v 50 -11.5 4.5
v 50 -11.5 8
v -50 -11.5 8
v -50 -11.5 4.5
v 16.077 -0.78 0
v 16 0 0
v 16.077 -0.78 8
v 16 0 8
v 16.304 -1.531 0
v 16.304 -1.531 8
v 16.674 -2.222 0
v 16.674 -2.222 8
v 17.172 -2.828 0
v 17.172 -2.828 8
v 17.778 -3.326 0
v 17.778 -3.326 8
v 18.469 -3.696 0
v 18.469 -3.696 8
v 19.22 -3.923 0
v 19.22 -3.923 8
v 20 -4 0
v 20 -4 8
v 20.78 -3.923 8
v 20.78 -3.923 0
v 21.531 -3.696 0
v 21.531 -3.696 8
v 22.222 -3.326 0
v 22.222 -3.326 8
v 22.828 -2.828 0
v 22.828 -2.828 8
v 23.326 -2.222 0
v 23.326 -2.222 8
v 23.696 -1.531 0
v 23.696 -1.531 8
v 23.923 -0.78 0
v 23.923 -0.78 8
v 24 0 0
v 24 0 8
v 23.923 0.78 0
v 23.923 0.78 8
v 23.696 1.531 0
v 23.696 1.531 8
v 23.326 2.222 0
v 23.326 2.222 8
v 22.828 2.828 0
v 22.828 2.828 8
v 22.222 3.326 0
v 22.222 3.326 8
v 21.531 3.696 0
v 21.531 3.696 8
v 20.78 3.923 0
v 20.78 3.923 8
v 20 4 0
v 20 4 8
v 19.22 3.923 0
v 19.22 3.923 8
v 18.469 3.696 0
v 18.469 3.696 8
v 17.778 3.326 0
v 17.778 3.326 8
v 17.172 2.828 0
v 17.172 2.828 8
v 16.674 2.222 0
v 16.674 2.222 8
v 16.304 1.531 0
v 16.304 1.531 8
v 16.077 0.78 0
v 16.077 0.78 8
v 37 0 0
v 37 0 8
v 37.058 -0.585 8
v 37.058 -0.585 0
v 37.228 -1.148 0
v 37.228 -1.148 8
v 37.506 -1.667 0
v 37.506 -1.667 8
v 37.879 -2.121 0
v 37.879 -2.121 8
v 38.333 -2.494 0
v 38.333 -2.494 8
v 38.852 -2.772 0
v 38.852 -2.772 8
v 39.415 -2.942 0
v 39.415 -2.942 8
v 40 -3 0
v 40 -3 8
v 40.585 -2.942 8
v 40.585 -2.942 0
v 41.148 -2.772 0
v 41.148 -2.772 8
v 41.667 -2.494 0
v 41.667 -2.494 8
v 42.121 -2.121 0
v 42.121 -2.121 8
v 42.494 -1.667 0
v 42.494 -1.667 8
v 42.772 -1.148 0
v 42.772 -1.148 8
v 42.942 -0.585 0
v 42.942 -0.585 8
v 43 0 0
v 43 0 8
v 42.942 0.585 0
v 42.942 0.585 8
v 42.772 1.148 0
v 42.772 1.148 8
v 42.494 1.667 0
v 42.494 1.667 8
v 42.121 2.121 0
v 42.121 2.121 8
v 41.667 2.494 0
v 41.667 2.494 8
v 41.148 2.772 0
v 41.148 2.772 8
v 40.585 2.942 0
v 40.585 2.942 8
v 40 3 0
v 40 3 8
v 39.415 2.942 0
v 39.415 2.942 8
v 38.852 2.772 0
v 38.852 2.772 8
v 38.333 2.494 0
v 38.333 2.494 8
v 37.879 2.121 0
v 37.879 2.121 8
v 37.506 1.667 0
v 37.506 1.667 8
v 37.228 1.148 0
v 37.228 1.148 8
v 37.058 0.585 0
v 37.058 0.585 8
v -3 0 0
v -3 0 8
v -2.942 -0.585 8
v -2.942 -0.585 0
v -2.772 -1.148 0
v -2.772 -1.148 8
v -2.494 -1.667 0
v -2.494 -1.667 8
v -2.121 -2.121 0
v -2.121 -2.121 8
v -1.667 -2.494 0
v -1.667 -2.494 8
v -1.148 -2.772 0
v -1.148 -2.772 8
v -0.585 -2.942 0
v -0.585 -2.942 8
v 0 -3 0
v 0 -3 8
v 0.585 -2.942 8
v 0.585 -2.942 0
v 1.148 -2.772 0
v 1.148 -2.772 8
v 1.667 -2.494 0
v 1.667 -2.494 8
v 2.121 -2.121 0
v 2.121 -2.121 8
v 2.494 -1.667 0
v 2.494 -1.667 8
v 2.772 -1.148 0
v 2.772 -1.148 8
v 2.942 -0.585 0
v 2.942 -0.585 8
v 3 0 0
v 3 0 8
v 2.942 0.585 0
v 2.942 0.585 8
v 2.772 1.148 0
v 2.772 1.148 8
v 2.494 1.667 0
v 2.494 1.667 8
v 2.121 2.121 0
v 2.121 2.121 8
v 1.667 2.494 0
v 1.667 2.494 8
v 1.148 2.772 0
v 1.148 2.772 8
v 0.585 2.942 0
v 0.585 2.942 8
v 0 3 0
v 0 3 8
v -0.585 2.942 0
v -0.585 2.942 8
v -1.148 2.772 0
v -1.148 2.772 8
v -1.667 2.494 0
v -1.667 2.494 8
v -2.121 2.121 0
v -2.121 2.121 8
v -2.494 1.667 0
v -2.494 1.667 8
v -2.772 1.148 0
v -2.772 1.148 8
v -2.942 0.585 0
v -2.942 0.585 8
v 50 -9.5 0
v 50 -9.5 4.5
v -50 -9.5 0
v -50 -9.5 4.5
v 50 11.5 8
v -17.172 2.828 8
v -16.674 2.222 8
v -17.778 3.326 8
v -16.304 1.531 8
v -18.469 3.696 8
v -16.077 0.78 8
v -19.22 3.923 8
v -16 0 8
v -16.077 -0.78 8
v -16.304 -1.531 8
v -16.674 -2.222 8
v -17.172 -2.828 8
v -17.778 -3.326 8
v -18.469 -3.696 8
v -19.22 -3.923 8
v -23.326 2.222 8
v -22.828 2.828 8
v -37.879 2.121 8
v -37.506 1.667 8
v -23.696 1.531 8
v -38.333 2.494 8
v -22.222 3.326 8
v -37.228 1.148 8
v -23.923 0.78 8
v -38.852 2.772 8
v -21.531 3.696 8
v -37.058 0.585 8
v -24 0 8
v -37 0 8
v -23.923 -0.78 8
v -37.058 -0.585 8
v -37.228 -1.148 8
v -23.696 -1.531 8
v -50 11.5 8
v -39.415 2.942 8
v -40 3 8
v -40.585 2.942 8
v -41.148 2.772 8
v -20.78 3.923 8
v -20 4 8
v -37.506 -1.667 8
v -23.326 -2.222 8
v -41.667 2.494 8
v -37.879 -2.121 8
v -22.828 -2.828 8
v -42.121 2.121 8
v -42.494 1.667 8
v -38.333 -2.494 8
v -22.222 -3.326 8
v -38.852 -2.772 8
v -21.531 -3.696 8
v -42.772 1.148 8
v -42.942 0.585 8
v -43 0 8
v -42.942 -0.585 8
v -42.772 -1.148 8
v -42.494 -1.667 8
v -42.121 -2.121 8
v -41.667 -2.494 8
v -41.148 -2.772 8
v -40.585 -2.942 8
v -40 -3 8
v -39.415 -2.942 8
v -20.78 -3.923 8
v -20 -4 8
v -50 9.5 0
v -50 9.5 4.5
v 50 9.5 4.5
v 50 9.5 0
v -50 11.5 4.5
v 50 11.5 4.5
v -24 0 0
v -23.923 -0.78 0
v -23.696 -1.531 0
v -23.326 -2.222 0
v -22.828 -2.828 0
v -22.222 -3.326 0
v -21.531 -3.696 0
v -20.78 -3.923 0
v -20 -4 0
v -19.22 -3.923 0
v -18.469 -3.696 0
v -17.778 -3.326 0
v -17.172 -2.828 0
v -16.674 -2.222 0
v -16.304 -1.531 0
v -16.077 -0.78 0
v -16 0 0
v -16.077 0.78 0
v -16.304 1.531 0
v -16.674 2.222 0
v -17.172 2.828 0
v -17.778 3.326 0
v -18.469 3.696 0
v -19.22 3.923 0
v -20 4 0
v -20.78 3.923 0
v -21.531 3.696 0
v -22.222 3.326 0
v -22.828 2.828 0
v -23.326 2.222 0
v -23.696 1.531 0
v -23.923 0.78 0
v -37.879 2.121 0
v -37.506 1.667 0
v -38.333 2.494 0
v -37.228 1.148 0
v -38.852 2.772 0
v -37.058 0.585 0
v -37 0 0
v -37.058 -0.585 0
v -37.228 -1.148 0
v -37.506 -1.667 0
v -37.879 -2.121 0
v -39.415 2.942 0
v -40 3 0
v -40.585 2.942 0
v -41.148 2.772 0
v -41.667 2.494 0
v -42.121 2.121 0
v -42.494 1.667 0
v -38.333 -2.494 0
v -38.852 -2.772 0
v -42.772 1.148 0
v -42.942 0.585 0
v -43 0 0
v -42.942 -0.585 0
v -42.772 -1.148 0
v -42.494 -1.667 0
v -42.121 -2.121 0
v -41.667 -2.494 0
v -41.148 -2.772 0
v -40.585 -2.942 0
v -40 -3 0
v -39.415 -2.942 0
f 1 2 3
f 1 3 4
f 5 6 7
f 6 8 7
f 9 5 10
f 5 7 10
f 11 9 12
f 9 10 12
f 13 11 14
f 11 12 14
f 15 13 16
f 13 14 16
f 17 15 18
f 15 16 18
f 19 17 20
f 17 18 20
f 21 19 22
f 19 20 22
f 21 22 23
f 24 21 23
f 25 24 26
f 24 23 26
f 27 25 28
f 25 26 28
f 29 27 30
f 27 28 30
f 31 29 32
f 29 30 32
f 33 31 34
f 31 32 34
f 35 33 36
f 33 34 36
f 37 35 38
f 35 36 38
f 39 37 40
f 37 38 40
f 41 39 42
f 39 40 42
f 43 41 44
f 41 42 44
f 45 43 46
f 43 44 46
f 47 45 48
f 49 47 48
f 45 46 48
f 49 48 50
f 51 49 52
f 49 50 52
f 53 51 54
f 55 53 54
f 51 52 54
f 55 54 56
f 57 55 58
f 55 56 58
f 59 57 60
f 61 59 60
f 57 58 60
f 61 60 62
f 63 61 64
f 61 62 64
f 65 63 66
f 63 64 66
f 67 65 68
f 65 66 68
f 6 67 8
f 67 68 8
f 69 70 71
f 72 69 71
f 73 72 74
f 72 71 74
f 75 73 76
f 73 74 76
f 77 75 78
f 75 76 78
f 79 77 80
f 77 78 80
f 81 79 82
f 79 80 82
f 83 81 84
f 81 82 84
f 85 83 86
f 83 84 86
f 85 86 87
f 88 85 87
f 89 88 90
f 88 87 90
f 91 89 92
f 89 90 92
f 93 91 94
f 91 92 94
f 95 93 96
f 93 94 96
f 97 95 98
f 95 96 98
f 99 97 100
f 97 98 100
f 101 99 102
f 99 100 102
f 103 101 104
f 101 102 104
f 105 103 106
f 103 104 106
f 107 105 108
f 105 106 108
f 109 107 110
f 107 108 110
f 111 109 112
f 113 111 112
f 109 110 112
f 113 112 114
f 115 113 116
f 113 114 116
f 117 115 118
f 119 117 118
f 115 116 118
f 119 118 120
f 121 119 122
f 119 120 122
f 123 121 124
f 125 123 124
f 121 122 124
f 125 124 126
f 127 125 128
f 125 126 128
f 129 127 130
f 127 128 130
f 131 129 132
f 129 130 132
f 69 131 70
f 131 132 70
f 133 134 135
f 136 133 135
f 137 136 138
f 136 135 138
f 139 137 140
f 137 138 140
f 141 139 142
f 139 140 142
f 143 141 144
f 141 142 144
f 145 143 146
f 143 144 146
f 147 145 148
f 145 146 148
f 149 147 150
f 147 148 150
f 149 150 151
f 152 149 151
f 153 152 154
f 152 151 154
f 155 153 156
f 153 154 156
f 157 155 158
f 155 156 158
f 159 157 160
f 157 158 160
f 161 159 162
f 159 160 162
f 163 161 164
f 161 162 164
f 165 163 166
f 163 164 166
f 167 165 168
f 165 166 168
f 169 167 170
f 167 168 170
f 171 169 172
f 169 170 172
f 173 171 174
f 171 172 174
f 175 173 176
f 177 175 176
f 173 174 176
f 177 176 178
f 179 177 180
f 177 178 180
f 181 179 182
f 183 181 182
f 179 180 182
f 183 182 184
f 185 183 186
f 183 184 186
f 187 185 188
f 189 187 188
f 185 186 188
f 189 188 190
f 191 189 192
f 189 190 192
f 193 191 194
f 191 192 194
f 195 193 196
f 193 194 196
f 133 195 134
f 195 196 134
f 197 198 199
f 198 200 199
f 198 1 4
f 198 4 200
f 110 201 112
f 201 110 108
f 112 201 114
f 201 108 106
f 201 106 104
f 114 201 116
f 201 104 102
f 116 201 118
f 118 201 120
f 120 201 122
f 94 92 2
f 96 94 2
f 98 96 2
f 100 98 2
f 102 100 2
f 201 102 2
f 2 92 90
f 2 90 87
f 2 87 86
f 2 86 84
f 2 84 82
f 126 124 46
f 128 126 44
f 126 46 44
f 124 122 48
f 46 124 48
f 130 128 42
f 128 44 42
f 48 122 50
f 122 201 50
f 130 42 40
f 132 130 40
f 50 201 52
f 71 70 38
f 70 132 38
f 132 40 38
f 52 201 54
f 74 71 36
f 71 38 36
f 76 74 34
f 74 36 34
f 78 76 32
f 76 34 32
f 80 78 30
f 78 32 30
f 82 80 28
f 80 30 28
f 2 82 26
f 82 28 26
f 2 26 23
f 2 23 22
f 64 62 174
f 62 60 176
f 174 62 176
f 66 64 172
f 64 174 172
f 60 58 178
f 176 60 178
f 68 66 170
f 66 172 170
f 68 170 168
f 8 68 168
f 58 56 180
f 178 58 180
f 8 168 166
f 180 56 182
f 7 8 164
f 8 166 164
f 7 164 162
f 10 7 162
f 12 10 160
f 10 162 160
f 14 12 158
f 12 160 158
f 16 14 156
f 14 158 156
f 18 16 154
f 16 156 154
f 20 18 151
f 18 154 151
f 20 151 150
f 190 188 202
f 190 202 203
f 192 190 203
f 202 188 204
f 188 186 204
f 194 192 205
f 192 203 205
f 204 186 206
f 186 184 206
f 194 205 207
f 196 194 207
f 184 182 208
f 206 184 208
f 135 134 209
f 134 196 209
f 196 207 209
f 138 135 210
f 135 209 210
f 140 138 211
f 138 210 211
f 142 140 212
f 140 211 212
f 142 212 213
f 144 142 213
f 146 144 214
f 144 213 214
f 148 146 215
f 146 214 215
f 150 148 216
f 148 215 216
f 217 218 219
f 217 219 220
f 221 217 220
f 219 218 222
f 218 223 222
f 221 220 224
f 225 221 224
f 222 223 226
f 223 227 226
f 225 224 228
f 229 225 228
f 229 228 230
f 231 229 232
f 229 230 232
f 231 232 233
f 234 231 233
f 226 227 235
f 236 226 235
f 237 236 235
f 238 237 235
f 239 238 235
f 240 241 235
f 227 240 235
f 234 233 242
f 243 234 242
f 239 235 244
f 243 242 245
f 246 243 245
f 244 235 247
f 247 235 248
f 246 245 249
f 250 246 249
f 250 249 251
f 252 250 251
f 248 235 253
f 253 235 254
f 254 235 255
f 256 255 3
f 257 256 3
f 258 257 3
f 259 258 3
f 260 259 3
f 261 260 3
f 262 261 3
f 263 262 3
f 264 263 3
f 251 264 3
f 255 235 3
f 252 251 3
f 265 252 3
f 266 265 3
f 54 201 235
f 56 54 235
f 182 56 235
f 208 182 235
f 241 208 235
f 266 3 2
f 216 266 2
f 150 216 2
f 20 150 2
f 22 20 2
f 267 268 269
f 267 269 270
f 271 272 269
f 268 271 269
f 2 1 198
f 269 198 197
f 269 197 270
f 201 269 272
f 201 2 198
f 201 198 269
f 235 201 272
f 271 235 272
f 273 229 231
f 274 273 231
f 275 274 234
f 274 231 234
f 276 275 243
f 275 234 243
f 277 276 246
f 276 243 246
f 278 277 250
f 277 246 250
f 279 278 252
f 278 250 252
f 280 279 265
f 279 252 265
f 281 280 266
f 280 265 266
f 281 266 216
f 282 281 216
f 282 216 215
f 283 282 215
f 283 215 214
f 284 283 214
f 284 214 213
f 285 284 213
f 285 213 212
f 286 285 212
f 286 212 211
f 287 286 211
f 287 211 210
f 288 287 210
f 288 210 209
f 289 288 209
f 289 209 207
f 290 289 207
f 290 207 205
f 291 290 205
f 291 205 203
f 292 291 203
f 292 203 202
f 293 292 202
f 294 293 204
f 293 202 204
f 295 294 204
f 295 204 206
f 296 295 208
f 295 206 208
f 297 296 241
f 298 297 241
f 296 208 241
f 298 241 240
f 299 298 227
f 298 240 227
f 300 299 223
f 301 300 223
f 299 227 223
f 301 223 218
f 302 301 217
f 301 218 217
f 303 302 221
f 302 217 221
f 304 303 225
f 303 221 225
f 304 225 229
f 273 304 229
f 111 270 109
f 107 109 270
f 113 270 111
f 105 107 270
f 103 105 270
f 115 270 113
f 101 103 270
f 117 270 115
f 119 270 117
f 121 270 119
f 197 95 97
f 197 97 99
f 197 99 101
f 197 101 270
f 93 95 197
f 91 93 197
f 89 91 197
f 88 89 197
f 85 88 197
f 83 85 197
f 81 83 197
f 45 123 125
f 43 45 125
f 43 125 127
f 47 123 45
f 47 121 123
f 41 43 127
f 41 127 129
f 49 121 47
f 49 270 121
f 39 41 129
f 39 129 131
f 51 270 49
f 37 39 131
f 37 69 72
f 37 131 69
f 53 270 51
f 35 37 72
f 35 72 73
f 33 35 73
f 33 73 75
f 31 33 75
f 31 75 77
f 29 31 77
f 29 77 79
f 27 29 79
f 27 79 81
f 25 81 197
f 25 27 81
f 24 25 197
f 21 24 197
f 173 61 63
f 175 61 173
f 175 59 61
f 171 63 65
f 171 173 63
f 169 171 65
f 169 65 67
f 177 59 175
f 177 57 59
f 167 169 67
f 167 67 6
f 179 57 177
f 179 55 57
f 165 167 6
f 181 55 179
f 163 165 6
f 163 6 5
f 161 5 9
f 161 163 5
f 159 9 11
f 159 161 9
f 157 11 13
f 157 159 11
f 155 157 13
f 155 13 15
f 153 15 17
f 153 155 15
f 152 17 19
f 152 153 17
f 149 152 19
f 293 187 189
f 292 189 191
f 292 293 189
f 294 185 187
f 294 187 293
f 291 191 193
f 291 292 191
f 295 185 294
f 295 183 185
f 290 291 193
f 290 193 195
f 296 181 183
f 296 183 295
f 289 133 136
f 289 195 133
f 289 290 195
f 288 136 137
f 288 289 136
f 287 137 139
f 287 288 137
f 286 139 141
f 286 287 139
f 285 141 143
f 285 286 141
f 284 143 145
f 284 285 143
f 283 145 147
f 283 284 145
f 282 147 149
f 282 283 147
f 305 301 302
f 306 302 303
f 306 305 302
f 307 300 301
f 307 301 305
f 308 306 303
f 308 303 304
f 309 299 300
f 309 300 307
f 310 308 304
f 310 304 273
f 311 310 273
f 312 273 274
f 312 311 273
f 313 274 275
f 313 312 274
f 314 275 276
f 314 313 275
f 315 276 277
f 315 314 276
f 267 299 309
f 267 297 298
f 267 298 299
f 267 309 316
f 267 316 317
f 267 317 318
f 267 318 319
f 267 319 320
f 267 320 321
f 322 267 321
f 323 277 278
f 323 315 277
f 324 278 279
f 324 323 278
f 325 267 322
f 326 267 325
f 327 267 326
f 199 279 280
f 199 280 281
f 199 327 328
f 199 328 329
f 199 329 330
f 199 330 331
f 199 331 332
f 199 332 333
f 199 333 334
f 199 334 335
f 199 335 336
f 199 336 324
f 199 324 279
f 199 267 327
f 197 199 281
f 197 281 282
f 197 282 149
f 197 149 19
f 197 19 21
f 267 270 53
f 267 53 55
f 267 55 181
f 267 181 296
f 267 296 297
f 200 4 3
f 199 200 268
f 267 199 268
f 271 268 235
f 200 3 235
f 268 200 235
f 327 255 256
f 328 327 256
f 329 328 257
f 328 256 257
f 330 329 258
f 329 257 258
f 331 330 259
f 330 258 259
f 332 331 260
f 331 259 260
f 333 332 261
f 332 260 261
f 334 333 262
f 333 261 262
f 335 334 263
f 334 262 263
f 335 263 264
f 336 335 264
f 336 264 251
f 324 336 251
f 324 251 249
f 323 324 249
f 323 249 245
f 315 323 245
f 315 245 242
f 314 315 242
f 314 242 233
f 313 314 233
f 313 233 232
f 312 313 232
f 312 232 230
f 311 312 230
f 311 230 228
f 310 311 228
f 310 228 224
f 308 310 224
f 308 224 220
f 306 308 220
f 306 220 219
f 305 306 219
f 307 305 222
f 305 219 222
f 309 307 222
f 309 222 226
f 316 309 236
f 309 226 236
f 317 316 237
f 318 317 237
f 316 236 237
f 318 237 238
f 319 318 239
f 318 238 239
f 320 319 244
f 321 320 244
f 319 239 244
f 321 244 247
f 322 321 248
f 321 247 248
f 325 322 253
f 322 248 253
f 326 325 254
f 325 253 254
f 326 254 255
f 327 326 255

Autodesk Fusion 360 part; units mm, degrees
sketch "Sketch1" plane through (0, 0, 0) normal (1, 0, 0) x (0, 1, 0)
  line L0 (0, 0) -> (9.5, 0)
  line L1 (0, 0) -> (0, 8) construction
  line L2 (0, 8) -> (11.5, 8)
  line L3 (11.5, 8) -> (11.5, 4.5)
  line L4 (11.5, 4.5) -> (9.5, 4.5)
  line L5 (9.5, 4.5) -> (9.5, 0)
  line L6 (-9.5, 4.5) -> (-9.5, 0)
  line L7 (-11.5, 8) -> (-11.5, 4.5)
  line L8 (0, 0) -> (-9.5, 0)
  line L9 (0, 8) -> (-11.5, 8)
  line L10 (-11.5, 4.5) -> (-9.5, 4.5)
  dimension "d1" = 9.5
  dimension "d2" = 8
  dimension "d3" = 11.5
  dimension "d4" = 3.5
extrude "Extrude1" add sketch "Sketch1" along normal mid plane 100
sketch "Sketch2" plane through (0, 0, 8) normal (0, 0, 1) x (-1, 0, 0)
  line L0 (50, 11.5) -> (-50, 11.5)
  line L1 (-50, 11.5) -> (-50, -11.5)
  line L2 (-50, -11.5) -> (50, -11.5)
  line L3 (50, -11.5) -> (50, 11.5)
  line L4 (50, 0) -> (40, 0) construction
  circle A0 centre (40, 0) radius 3
  line L5 (40, 0) -> (20, 0) construction
  circle A1 centre (20, 0) radius 4
  dimension "d11" = 10
  dimension "d12" = 6
  dimension "d13" = 20
  dimension "d14" = 8
extrude "Extrude2" cut sketch "Sketch2" against normal up to surface (8 mm away) contours A0 | A1
pattern_linear "R-Pattern1" count 5 spacing 40 along (1, 0, 0) of "Extrude2"
equation "d1 = ( 19 / 2 ) * 1 mm"
equation "d3 = ( 23 / 2 ) * 1 mm"
equation "Alu_M6_M8_T_track_length_slider = 100 mm"
equation "d6 = Alu_M6_M8_T_track_length_slider / 2"
